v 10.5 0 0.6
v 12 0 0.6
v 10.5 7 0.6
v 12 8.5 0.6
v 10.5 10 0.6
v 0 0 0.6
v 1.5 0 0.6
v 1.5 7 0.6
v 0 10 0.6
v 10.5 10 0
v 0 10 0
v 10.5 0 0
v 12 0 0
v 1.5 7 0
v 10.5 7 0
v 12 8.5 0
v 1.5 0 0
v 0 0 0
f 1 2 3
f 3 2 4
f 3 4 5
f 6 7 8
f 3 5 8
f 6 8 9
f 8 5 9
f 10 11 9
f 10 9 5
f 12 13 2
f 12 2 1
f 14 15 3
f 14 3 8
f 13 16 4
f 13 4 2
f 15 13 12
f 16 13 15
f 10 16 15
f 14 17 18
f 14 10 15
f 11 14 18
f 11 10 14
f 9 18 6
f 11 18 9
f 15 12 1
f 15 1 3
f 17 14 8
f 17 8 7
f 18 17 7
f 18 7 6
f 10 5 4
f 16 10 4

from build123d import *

# Parameters (mm, degrees)
BOSS_EXTRUDE1_DEPTH = 0.6
CUT_EXTRUDE1_DEPTH  = 16.632018424


with BuildPart() as part:
    # Sketch1 → Boss-Extrude1 (new body)
    with BuildSketch(Plane.XY):
        Polygon((0, 0), (0, 10), (12, 10), (12, 0), (10.5, 0), (10.5, 7), (1.5, 7), (1.5, 0), align=None)
    extrude(amount=BOSS_EXTRUDE1_DEPTH)

    # Sketch2 → Cut-Extrude1 (cut, through all)
    with BuildSketch(Plane.XY.offset(0.6)):
        Polygon((10.5, 10), (12, 8.5), (12, 10), align=None)
    extrude(amount=-CUT_EXTRUDE1_DEPTH, mode=Mode.SUBTRACT)


solid = part.part
